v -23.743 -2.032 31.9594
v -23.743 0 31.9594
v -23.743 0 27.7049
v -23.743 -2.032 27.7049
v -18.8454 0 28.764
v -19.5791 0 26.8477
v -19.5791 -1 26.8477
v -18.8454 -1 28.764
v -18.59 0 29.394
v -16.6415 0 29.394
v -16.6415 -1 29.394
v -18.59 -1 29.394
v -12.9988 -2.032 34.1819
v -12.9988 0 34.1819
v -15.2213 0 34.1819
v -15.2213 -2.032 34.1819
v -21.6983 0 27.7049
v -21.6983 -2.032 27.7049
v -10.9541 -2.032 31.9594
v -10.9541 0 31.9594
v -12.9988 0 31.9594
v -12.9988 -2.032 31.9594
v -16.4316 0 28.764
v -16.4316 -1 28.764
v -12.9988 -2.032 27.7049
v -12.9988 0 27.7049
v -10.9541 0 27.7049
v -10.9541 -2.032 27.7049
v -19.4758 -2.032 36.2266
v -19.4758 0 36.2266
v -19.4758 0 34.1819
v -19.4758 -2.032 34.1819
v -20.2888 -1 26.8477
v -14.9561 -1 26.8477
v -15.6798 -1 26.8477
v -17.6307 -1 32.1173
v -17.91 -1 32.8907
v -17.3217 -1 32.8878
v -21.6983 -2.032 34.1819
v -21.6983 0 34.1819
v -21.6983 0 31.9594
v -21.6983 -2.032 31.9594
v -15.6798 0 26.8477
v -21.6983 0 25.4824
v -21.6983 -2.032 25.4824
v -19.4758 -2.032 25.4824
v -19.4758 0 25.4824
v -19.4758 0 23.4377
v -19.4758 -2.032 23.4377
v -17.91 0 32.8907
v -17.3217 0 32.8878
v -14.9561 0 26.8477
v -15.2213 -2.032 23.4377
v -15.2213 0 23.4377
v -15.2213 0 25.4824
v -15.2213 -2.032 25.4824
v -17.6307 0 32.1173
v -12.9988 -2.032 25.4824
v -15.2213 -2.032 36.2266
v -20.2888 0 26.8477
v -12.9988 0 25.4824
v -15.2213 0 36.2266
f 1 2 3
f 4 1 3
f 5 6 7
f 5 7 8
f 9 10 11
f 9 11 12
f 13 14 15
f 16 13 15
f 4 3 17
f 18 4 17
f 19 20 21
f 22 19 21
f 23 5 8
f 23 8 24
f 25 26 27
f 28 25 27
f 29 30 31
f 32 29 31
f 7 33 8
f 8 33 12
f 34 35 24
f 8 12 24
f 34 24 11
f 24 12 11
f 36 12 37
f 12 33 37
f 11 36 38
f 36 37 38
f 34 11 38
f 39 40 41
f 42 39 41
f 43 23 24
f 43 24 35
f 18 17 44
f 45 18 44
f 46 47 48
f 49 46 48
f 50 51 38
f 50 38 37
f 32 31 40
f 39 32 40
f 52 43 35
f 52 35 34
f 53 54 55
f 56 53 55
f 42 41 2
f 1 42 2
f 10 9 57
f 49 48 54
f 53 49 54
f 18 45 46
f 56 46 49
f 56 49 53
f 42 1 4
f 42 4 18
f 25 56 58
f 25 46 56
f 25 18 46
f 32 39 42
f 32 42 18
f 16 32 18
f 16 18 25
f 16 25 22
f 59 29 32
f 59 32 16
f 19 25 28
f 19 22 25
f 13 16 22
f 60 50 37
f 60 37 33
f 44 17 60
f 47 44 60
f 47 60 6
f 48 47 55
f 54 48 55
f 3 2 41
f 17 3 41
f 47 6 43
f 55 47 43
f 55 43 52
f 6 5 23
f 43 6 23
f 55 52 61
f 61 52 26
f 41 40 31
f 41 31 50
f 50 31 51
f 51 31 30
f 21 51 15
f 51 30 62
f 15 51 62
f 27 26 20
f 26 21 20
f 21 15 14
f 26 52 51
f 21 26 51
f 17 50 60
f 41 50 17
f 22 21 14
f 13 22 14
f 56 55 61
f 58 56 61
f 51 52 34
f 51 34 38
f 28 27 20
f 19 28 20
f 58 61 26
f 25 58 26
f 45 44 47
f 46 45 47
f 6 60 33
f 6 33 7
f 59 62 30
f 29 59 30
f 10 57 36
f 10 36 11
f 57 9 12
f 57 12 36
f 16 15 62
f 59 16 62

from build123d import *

# Parameters (mm, degrees)
F1_DEPTH = 2.032
F2_DEPTH = 1


# Not quite as in the source:
# - a feature names something its author has since deleted; it is built from what else it names


with BuildPart() as f1:
    # F0 (on Front) → F1 (new body)
    with BuildSketch(Plane.XZ):
        Polygon((-15.2212520439, 36.2265945869), (-17.3485020439, 36.2265945869), (-19.4757520439, 36.2265945869), (-19.4757520439, 34.1818945869), (-21.6982520439, 34.1818945869), (-21.6982520439, 31.9593945869), (-23.7429520439, 31.9593945869), (-23.7429520439, 29.8321445869), (-23.7429520439, 27.7048945869), (-21.6982520439, 27.7048945869), (-21.6982520439, 25.4823945869), (-19.4757520439, 25.4823945869), (-19.4757520439, 23.4376945869), (-17.3485020439, 23.4376945869), (-15.2212520439, 23.4376945869), (-15.2212520439, 25.4823945869), (-12.9987520439, 25.4823945869), (-12.9987520439, 27.7048945869), (-10.9540520439, 27.7048945869), (-10.9540520439, 29.8321445869), (-10.9540520439, 31.9593945869), (-12.9987520439, 31.9593945869), (-12.9987520439, 34.1818945869), (-15.2212520439, 34.1818945869), align=None)
        Polygon((-20.2887904064, 26.8476658233), (-17.9100000431, 32.8906836652), (-17.3217338641, 32.8878096037), (-14.9560986218, 26.8476658233), (-15.6798228753, 26.8476658233), (-16.4316139315, 28.7639858865), (-18.8453636264, 28.7639858865), (-19.5791117047, 26.8476658233), align=None, mode=Mode.SUBTRACT)
        Polygon((-17.3217338641, 32.8878096037), (-17.9100000431, 32.8906836652), (-20.2887904064, 26.8476658233), (-19.5791117047, 26.8476658233), (-18.8453636264, 28.7639858865), (-16.4316139315, 28.7639858865), (-15.6798228753, 26.8476658233), (-14.9560986218, 26.8476658233), align=None)
        Polygon((-18.5900452678, 29.3939520338), (-17.6306684633, 32.1173264378), (-16.6415135508, 29.3939520338), align=None, mode=Mode.SUBTRACT)
        Polygon((-16.6415135508, 29.3939520338), (-17.6306684633, 32.1173264378), (-18.5900452678, 29.3939520338), align=None)
    extrude(amount=F1_DEPTH)

    # F0 (on Front) → F2 (cut)
    with BuildSketch(Plane.XZ):
        Polygon((-17.3217338641, 32.8878096037), (-17.9100000431, 32.8906836652), (-20.2887904064, 26.8476658233), (-19.5791117047, 26.8476658233), (-18.8453636264, 28.7639858865), (-16.4316139315, 28.7639858865), (-15.6798228753, 26.8476658233), (-14.9560986218, 26.8476658233), align=None)
        Polygon((-18.5900452678, 29.3939520338), (-17.6306684633, 32.1173264378), (-16.6415135508, 29.3939520338), align=None, mode=Mode.SUBTRACT)
    extrude(amount=F2_DEPTH, mode=Mode.SUBTRACT)


solid = f1.part
